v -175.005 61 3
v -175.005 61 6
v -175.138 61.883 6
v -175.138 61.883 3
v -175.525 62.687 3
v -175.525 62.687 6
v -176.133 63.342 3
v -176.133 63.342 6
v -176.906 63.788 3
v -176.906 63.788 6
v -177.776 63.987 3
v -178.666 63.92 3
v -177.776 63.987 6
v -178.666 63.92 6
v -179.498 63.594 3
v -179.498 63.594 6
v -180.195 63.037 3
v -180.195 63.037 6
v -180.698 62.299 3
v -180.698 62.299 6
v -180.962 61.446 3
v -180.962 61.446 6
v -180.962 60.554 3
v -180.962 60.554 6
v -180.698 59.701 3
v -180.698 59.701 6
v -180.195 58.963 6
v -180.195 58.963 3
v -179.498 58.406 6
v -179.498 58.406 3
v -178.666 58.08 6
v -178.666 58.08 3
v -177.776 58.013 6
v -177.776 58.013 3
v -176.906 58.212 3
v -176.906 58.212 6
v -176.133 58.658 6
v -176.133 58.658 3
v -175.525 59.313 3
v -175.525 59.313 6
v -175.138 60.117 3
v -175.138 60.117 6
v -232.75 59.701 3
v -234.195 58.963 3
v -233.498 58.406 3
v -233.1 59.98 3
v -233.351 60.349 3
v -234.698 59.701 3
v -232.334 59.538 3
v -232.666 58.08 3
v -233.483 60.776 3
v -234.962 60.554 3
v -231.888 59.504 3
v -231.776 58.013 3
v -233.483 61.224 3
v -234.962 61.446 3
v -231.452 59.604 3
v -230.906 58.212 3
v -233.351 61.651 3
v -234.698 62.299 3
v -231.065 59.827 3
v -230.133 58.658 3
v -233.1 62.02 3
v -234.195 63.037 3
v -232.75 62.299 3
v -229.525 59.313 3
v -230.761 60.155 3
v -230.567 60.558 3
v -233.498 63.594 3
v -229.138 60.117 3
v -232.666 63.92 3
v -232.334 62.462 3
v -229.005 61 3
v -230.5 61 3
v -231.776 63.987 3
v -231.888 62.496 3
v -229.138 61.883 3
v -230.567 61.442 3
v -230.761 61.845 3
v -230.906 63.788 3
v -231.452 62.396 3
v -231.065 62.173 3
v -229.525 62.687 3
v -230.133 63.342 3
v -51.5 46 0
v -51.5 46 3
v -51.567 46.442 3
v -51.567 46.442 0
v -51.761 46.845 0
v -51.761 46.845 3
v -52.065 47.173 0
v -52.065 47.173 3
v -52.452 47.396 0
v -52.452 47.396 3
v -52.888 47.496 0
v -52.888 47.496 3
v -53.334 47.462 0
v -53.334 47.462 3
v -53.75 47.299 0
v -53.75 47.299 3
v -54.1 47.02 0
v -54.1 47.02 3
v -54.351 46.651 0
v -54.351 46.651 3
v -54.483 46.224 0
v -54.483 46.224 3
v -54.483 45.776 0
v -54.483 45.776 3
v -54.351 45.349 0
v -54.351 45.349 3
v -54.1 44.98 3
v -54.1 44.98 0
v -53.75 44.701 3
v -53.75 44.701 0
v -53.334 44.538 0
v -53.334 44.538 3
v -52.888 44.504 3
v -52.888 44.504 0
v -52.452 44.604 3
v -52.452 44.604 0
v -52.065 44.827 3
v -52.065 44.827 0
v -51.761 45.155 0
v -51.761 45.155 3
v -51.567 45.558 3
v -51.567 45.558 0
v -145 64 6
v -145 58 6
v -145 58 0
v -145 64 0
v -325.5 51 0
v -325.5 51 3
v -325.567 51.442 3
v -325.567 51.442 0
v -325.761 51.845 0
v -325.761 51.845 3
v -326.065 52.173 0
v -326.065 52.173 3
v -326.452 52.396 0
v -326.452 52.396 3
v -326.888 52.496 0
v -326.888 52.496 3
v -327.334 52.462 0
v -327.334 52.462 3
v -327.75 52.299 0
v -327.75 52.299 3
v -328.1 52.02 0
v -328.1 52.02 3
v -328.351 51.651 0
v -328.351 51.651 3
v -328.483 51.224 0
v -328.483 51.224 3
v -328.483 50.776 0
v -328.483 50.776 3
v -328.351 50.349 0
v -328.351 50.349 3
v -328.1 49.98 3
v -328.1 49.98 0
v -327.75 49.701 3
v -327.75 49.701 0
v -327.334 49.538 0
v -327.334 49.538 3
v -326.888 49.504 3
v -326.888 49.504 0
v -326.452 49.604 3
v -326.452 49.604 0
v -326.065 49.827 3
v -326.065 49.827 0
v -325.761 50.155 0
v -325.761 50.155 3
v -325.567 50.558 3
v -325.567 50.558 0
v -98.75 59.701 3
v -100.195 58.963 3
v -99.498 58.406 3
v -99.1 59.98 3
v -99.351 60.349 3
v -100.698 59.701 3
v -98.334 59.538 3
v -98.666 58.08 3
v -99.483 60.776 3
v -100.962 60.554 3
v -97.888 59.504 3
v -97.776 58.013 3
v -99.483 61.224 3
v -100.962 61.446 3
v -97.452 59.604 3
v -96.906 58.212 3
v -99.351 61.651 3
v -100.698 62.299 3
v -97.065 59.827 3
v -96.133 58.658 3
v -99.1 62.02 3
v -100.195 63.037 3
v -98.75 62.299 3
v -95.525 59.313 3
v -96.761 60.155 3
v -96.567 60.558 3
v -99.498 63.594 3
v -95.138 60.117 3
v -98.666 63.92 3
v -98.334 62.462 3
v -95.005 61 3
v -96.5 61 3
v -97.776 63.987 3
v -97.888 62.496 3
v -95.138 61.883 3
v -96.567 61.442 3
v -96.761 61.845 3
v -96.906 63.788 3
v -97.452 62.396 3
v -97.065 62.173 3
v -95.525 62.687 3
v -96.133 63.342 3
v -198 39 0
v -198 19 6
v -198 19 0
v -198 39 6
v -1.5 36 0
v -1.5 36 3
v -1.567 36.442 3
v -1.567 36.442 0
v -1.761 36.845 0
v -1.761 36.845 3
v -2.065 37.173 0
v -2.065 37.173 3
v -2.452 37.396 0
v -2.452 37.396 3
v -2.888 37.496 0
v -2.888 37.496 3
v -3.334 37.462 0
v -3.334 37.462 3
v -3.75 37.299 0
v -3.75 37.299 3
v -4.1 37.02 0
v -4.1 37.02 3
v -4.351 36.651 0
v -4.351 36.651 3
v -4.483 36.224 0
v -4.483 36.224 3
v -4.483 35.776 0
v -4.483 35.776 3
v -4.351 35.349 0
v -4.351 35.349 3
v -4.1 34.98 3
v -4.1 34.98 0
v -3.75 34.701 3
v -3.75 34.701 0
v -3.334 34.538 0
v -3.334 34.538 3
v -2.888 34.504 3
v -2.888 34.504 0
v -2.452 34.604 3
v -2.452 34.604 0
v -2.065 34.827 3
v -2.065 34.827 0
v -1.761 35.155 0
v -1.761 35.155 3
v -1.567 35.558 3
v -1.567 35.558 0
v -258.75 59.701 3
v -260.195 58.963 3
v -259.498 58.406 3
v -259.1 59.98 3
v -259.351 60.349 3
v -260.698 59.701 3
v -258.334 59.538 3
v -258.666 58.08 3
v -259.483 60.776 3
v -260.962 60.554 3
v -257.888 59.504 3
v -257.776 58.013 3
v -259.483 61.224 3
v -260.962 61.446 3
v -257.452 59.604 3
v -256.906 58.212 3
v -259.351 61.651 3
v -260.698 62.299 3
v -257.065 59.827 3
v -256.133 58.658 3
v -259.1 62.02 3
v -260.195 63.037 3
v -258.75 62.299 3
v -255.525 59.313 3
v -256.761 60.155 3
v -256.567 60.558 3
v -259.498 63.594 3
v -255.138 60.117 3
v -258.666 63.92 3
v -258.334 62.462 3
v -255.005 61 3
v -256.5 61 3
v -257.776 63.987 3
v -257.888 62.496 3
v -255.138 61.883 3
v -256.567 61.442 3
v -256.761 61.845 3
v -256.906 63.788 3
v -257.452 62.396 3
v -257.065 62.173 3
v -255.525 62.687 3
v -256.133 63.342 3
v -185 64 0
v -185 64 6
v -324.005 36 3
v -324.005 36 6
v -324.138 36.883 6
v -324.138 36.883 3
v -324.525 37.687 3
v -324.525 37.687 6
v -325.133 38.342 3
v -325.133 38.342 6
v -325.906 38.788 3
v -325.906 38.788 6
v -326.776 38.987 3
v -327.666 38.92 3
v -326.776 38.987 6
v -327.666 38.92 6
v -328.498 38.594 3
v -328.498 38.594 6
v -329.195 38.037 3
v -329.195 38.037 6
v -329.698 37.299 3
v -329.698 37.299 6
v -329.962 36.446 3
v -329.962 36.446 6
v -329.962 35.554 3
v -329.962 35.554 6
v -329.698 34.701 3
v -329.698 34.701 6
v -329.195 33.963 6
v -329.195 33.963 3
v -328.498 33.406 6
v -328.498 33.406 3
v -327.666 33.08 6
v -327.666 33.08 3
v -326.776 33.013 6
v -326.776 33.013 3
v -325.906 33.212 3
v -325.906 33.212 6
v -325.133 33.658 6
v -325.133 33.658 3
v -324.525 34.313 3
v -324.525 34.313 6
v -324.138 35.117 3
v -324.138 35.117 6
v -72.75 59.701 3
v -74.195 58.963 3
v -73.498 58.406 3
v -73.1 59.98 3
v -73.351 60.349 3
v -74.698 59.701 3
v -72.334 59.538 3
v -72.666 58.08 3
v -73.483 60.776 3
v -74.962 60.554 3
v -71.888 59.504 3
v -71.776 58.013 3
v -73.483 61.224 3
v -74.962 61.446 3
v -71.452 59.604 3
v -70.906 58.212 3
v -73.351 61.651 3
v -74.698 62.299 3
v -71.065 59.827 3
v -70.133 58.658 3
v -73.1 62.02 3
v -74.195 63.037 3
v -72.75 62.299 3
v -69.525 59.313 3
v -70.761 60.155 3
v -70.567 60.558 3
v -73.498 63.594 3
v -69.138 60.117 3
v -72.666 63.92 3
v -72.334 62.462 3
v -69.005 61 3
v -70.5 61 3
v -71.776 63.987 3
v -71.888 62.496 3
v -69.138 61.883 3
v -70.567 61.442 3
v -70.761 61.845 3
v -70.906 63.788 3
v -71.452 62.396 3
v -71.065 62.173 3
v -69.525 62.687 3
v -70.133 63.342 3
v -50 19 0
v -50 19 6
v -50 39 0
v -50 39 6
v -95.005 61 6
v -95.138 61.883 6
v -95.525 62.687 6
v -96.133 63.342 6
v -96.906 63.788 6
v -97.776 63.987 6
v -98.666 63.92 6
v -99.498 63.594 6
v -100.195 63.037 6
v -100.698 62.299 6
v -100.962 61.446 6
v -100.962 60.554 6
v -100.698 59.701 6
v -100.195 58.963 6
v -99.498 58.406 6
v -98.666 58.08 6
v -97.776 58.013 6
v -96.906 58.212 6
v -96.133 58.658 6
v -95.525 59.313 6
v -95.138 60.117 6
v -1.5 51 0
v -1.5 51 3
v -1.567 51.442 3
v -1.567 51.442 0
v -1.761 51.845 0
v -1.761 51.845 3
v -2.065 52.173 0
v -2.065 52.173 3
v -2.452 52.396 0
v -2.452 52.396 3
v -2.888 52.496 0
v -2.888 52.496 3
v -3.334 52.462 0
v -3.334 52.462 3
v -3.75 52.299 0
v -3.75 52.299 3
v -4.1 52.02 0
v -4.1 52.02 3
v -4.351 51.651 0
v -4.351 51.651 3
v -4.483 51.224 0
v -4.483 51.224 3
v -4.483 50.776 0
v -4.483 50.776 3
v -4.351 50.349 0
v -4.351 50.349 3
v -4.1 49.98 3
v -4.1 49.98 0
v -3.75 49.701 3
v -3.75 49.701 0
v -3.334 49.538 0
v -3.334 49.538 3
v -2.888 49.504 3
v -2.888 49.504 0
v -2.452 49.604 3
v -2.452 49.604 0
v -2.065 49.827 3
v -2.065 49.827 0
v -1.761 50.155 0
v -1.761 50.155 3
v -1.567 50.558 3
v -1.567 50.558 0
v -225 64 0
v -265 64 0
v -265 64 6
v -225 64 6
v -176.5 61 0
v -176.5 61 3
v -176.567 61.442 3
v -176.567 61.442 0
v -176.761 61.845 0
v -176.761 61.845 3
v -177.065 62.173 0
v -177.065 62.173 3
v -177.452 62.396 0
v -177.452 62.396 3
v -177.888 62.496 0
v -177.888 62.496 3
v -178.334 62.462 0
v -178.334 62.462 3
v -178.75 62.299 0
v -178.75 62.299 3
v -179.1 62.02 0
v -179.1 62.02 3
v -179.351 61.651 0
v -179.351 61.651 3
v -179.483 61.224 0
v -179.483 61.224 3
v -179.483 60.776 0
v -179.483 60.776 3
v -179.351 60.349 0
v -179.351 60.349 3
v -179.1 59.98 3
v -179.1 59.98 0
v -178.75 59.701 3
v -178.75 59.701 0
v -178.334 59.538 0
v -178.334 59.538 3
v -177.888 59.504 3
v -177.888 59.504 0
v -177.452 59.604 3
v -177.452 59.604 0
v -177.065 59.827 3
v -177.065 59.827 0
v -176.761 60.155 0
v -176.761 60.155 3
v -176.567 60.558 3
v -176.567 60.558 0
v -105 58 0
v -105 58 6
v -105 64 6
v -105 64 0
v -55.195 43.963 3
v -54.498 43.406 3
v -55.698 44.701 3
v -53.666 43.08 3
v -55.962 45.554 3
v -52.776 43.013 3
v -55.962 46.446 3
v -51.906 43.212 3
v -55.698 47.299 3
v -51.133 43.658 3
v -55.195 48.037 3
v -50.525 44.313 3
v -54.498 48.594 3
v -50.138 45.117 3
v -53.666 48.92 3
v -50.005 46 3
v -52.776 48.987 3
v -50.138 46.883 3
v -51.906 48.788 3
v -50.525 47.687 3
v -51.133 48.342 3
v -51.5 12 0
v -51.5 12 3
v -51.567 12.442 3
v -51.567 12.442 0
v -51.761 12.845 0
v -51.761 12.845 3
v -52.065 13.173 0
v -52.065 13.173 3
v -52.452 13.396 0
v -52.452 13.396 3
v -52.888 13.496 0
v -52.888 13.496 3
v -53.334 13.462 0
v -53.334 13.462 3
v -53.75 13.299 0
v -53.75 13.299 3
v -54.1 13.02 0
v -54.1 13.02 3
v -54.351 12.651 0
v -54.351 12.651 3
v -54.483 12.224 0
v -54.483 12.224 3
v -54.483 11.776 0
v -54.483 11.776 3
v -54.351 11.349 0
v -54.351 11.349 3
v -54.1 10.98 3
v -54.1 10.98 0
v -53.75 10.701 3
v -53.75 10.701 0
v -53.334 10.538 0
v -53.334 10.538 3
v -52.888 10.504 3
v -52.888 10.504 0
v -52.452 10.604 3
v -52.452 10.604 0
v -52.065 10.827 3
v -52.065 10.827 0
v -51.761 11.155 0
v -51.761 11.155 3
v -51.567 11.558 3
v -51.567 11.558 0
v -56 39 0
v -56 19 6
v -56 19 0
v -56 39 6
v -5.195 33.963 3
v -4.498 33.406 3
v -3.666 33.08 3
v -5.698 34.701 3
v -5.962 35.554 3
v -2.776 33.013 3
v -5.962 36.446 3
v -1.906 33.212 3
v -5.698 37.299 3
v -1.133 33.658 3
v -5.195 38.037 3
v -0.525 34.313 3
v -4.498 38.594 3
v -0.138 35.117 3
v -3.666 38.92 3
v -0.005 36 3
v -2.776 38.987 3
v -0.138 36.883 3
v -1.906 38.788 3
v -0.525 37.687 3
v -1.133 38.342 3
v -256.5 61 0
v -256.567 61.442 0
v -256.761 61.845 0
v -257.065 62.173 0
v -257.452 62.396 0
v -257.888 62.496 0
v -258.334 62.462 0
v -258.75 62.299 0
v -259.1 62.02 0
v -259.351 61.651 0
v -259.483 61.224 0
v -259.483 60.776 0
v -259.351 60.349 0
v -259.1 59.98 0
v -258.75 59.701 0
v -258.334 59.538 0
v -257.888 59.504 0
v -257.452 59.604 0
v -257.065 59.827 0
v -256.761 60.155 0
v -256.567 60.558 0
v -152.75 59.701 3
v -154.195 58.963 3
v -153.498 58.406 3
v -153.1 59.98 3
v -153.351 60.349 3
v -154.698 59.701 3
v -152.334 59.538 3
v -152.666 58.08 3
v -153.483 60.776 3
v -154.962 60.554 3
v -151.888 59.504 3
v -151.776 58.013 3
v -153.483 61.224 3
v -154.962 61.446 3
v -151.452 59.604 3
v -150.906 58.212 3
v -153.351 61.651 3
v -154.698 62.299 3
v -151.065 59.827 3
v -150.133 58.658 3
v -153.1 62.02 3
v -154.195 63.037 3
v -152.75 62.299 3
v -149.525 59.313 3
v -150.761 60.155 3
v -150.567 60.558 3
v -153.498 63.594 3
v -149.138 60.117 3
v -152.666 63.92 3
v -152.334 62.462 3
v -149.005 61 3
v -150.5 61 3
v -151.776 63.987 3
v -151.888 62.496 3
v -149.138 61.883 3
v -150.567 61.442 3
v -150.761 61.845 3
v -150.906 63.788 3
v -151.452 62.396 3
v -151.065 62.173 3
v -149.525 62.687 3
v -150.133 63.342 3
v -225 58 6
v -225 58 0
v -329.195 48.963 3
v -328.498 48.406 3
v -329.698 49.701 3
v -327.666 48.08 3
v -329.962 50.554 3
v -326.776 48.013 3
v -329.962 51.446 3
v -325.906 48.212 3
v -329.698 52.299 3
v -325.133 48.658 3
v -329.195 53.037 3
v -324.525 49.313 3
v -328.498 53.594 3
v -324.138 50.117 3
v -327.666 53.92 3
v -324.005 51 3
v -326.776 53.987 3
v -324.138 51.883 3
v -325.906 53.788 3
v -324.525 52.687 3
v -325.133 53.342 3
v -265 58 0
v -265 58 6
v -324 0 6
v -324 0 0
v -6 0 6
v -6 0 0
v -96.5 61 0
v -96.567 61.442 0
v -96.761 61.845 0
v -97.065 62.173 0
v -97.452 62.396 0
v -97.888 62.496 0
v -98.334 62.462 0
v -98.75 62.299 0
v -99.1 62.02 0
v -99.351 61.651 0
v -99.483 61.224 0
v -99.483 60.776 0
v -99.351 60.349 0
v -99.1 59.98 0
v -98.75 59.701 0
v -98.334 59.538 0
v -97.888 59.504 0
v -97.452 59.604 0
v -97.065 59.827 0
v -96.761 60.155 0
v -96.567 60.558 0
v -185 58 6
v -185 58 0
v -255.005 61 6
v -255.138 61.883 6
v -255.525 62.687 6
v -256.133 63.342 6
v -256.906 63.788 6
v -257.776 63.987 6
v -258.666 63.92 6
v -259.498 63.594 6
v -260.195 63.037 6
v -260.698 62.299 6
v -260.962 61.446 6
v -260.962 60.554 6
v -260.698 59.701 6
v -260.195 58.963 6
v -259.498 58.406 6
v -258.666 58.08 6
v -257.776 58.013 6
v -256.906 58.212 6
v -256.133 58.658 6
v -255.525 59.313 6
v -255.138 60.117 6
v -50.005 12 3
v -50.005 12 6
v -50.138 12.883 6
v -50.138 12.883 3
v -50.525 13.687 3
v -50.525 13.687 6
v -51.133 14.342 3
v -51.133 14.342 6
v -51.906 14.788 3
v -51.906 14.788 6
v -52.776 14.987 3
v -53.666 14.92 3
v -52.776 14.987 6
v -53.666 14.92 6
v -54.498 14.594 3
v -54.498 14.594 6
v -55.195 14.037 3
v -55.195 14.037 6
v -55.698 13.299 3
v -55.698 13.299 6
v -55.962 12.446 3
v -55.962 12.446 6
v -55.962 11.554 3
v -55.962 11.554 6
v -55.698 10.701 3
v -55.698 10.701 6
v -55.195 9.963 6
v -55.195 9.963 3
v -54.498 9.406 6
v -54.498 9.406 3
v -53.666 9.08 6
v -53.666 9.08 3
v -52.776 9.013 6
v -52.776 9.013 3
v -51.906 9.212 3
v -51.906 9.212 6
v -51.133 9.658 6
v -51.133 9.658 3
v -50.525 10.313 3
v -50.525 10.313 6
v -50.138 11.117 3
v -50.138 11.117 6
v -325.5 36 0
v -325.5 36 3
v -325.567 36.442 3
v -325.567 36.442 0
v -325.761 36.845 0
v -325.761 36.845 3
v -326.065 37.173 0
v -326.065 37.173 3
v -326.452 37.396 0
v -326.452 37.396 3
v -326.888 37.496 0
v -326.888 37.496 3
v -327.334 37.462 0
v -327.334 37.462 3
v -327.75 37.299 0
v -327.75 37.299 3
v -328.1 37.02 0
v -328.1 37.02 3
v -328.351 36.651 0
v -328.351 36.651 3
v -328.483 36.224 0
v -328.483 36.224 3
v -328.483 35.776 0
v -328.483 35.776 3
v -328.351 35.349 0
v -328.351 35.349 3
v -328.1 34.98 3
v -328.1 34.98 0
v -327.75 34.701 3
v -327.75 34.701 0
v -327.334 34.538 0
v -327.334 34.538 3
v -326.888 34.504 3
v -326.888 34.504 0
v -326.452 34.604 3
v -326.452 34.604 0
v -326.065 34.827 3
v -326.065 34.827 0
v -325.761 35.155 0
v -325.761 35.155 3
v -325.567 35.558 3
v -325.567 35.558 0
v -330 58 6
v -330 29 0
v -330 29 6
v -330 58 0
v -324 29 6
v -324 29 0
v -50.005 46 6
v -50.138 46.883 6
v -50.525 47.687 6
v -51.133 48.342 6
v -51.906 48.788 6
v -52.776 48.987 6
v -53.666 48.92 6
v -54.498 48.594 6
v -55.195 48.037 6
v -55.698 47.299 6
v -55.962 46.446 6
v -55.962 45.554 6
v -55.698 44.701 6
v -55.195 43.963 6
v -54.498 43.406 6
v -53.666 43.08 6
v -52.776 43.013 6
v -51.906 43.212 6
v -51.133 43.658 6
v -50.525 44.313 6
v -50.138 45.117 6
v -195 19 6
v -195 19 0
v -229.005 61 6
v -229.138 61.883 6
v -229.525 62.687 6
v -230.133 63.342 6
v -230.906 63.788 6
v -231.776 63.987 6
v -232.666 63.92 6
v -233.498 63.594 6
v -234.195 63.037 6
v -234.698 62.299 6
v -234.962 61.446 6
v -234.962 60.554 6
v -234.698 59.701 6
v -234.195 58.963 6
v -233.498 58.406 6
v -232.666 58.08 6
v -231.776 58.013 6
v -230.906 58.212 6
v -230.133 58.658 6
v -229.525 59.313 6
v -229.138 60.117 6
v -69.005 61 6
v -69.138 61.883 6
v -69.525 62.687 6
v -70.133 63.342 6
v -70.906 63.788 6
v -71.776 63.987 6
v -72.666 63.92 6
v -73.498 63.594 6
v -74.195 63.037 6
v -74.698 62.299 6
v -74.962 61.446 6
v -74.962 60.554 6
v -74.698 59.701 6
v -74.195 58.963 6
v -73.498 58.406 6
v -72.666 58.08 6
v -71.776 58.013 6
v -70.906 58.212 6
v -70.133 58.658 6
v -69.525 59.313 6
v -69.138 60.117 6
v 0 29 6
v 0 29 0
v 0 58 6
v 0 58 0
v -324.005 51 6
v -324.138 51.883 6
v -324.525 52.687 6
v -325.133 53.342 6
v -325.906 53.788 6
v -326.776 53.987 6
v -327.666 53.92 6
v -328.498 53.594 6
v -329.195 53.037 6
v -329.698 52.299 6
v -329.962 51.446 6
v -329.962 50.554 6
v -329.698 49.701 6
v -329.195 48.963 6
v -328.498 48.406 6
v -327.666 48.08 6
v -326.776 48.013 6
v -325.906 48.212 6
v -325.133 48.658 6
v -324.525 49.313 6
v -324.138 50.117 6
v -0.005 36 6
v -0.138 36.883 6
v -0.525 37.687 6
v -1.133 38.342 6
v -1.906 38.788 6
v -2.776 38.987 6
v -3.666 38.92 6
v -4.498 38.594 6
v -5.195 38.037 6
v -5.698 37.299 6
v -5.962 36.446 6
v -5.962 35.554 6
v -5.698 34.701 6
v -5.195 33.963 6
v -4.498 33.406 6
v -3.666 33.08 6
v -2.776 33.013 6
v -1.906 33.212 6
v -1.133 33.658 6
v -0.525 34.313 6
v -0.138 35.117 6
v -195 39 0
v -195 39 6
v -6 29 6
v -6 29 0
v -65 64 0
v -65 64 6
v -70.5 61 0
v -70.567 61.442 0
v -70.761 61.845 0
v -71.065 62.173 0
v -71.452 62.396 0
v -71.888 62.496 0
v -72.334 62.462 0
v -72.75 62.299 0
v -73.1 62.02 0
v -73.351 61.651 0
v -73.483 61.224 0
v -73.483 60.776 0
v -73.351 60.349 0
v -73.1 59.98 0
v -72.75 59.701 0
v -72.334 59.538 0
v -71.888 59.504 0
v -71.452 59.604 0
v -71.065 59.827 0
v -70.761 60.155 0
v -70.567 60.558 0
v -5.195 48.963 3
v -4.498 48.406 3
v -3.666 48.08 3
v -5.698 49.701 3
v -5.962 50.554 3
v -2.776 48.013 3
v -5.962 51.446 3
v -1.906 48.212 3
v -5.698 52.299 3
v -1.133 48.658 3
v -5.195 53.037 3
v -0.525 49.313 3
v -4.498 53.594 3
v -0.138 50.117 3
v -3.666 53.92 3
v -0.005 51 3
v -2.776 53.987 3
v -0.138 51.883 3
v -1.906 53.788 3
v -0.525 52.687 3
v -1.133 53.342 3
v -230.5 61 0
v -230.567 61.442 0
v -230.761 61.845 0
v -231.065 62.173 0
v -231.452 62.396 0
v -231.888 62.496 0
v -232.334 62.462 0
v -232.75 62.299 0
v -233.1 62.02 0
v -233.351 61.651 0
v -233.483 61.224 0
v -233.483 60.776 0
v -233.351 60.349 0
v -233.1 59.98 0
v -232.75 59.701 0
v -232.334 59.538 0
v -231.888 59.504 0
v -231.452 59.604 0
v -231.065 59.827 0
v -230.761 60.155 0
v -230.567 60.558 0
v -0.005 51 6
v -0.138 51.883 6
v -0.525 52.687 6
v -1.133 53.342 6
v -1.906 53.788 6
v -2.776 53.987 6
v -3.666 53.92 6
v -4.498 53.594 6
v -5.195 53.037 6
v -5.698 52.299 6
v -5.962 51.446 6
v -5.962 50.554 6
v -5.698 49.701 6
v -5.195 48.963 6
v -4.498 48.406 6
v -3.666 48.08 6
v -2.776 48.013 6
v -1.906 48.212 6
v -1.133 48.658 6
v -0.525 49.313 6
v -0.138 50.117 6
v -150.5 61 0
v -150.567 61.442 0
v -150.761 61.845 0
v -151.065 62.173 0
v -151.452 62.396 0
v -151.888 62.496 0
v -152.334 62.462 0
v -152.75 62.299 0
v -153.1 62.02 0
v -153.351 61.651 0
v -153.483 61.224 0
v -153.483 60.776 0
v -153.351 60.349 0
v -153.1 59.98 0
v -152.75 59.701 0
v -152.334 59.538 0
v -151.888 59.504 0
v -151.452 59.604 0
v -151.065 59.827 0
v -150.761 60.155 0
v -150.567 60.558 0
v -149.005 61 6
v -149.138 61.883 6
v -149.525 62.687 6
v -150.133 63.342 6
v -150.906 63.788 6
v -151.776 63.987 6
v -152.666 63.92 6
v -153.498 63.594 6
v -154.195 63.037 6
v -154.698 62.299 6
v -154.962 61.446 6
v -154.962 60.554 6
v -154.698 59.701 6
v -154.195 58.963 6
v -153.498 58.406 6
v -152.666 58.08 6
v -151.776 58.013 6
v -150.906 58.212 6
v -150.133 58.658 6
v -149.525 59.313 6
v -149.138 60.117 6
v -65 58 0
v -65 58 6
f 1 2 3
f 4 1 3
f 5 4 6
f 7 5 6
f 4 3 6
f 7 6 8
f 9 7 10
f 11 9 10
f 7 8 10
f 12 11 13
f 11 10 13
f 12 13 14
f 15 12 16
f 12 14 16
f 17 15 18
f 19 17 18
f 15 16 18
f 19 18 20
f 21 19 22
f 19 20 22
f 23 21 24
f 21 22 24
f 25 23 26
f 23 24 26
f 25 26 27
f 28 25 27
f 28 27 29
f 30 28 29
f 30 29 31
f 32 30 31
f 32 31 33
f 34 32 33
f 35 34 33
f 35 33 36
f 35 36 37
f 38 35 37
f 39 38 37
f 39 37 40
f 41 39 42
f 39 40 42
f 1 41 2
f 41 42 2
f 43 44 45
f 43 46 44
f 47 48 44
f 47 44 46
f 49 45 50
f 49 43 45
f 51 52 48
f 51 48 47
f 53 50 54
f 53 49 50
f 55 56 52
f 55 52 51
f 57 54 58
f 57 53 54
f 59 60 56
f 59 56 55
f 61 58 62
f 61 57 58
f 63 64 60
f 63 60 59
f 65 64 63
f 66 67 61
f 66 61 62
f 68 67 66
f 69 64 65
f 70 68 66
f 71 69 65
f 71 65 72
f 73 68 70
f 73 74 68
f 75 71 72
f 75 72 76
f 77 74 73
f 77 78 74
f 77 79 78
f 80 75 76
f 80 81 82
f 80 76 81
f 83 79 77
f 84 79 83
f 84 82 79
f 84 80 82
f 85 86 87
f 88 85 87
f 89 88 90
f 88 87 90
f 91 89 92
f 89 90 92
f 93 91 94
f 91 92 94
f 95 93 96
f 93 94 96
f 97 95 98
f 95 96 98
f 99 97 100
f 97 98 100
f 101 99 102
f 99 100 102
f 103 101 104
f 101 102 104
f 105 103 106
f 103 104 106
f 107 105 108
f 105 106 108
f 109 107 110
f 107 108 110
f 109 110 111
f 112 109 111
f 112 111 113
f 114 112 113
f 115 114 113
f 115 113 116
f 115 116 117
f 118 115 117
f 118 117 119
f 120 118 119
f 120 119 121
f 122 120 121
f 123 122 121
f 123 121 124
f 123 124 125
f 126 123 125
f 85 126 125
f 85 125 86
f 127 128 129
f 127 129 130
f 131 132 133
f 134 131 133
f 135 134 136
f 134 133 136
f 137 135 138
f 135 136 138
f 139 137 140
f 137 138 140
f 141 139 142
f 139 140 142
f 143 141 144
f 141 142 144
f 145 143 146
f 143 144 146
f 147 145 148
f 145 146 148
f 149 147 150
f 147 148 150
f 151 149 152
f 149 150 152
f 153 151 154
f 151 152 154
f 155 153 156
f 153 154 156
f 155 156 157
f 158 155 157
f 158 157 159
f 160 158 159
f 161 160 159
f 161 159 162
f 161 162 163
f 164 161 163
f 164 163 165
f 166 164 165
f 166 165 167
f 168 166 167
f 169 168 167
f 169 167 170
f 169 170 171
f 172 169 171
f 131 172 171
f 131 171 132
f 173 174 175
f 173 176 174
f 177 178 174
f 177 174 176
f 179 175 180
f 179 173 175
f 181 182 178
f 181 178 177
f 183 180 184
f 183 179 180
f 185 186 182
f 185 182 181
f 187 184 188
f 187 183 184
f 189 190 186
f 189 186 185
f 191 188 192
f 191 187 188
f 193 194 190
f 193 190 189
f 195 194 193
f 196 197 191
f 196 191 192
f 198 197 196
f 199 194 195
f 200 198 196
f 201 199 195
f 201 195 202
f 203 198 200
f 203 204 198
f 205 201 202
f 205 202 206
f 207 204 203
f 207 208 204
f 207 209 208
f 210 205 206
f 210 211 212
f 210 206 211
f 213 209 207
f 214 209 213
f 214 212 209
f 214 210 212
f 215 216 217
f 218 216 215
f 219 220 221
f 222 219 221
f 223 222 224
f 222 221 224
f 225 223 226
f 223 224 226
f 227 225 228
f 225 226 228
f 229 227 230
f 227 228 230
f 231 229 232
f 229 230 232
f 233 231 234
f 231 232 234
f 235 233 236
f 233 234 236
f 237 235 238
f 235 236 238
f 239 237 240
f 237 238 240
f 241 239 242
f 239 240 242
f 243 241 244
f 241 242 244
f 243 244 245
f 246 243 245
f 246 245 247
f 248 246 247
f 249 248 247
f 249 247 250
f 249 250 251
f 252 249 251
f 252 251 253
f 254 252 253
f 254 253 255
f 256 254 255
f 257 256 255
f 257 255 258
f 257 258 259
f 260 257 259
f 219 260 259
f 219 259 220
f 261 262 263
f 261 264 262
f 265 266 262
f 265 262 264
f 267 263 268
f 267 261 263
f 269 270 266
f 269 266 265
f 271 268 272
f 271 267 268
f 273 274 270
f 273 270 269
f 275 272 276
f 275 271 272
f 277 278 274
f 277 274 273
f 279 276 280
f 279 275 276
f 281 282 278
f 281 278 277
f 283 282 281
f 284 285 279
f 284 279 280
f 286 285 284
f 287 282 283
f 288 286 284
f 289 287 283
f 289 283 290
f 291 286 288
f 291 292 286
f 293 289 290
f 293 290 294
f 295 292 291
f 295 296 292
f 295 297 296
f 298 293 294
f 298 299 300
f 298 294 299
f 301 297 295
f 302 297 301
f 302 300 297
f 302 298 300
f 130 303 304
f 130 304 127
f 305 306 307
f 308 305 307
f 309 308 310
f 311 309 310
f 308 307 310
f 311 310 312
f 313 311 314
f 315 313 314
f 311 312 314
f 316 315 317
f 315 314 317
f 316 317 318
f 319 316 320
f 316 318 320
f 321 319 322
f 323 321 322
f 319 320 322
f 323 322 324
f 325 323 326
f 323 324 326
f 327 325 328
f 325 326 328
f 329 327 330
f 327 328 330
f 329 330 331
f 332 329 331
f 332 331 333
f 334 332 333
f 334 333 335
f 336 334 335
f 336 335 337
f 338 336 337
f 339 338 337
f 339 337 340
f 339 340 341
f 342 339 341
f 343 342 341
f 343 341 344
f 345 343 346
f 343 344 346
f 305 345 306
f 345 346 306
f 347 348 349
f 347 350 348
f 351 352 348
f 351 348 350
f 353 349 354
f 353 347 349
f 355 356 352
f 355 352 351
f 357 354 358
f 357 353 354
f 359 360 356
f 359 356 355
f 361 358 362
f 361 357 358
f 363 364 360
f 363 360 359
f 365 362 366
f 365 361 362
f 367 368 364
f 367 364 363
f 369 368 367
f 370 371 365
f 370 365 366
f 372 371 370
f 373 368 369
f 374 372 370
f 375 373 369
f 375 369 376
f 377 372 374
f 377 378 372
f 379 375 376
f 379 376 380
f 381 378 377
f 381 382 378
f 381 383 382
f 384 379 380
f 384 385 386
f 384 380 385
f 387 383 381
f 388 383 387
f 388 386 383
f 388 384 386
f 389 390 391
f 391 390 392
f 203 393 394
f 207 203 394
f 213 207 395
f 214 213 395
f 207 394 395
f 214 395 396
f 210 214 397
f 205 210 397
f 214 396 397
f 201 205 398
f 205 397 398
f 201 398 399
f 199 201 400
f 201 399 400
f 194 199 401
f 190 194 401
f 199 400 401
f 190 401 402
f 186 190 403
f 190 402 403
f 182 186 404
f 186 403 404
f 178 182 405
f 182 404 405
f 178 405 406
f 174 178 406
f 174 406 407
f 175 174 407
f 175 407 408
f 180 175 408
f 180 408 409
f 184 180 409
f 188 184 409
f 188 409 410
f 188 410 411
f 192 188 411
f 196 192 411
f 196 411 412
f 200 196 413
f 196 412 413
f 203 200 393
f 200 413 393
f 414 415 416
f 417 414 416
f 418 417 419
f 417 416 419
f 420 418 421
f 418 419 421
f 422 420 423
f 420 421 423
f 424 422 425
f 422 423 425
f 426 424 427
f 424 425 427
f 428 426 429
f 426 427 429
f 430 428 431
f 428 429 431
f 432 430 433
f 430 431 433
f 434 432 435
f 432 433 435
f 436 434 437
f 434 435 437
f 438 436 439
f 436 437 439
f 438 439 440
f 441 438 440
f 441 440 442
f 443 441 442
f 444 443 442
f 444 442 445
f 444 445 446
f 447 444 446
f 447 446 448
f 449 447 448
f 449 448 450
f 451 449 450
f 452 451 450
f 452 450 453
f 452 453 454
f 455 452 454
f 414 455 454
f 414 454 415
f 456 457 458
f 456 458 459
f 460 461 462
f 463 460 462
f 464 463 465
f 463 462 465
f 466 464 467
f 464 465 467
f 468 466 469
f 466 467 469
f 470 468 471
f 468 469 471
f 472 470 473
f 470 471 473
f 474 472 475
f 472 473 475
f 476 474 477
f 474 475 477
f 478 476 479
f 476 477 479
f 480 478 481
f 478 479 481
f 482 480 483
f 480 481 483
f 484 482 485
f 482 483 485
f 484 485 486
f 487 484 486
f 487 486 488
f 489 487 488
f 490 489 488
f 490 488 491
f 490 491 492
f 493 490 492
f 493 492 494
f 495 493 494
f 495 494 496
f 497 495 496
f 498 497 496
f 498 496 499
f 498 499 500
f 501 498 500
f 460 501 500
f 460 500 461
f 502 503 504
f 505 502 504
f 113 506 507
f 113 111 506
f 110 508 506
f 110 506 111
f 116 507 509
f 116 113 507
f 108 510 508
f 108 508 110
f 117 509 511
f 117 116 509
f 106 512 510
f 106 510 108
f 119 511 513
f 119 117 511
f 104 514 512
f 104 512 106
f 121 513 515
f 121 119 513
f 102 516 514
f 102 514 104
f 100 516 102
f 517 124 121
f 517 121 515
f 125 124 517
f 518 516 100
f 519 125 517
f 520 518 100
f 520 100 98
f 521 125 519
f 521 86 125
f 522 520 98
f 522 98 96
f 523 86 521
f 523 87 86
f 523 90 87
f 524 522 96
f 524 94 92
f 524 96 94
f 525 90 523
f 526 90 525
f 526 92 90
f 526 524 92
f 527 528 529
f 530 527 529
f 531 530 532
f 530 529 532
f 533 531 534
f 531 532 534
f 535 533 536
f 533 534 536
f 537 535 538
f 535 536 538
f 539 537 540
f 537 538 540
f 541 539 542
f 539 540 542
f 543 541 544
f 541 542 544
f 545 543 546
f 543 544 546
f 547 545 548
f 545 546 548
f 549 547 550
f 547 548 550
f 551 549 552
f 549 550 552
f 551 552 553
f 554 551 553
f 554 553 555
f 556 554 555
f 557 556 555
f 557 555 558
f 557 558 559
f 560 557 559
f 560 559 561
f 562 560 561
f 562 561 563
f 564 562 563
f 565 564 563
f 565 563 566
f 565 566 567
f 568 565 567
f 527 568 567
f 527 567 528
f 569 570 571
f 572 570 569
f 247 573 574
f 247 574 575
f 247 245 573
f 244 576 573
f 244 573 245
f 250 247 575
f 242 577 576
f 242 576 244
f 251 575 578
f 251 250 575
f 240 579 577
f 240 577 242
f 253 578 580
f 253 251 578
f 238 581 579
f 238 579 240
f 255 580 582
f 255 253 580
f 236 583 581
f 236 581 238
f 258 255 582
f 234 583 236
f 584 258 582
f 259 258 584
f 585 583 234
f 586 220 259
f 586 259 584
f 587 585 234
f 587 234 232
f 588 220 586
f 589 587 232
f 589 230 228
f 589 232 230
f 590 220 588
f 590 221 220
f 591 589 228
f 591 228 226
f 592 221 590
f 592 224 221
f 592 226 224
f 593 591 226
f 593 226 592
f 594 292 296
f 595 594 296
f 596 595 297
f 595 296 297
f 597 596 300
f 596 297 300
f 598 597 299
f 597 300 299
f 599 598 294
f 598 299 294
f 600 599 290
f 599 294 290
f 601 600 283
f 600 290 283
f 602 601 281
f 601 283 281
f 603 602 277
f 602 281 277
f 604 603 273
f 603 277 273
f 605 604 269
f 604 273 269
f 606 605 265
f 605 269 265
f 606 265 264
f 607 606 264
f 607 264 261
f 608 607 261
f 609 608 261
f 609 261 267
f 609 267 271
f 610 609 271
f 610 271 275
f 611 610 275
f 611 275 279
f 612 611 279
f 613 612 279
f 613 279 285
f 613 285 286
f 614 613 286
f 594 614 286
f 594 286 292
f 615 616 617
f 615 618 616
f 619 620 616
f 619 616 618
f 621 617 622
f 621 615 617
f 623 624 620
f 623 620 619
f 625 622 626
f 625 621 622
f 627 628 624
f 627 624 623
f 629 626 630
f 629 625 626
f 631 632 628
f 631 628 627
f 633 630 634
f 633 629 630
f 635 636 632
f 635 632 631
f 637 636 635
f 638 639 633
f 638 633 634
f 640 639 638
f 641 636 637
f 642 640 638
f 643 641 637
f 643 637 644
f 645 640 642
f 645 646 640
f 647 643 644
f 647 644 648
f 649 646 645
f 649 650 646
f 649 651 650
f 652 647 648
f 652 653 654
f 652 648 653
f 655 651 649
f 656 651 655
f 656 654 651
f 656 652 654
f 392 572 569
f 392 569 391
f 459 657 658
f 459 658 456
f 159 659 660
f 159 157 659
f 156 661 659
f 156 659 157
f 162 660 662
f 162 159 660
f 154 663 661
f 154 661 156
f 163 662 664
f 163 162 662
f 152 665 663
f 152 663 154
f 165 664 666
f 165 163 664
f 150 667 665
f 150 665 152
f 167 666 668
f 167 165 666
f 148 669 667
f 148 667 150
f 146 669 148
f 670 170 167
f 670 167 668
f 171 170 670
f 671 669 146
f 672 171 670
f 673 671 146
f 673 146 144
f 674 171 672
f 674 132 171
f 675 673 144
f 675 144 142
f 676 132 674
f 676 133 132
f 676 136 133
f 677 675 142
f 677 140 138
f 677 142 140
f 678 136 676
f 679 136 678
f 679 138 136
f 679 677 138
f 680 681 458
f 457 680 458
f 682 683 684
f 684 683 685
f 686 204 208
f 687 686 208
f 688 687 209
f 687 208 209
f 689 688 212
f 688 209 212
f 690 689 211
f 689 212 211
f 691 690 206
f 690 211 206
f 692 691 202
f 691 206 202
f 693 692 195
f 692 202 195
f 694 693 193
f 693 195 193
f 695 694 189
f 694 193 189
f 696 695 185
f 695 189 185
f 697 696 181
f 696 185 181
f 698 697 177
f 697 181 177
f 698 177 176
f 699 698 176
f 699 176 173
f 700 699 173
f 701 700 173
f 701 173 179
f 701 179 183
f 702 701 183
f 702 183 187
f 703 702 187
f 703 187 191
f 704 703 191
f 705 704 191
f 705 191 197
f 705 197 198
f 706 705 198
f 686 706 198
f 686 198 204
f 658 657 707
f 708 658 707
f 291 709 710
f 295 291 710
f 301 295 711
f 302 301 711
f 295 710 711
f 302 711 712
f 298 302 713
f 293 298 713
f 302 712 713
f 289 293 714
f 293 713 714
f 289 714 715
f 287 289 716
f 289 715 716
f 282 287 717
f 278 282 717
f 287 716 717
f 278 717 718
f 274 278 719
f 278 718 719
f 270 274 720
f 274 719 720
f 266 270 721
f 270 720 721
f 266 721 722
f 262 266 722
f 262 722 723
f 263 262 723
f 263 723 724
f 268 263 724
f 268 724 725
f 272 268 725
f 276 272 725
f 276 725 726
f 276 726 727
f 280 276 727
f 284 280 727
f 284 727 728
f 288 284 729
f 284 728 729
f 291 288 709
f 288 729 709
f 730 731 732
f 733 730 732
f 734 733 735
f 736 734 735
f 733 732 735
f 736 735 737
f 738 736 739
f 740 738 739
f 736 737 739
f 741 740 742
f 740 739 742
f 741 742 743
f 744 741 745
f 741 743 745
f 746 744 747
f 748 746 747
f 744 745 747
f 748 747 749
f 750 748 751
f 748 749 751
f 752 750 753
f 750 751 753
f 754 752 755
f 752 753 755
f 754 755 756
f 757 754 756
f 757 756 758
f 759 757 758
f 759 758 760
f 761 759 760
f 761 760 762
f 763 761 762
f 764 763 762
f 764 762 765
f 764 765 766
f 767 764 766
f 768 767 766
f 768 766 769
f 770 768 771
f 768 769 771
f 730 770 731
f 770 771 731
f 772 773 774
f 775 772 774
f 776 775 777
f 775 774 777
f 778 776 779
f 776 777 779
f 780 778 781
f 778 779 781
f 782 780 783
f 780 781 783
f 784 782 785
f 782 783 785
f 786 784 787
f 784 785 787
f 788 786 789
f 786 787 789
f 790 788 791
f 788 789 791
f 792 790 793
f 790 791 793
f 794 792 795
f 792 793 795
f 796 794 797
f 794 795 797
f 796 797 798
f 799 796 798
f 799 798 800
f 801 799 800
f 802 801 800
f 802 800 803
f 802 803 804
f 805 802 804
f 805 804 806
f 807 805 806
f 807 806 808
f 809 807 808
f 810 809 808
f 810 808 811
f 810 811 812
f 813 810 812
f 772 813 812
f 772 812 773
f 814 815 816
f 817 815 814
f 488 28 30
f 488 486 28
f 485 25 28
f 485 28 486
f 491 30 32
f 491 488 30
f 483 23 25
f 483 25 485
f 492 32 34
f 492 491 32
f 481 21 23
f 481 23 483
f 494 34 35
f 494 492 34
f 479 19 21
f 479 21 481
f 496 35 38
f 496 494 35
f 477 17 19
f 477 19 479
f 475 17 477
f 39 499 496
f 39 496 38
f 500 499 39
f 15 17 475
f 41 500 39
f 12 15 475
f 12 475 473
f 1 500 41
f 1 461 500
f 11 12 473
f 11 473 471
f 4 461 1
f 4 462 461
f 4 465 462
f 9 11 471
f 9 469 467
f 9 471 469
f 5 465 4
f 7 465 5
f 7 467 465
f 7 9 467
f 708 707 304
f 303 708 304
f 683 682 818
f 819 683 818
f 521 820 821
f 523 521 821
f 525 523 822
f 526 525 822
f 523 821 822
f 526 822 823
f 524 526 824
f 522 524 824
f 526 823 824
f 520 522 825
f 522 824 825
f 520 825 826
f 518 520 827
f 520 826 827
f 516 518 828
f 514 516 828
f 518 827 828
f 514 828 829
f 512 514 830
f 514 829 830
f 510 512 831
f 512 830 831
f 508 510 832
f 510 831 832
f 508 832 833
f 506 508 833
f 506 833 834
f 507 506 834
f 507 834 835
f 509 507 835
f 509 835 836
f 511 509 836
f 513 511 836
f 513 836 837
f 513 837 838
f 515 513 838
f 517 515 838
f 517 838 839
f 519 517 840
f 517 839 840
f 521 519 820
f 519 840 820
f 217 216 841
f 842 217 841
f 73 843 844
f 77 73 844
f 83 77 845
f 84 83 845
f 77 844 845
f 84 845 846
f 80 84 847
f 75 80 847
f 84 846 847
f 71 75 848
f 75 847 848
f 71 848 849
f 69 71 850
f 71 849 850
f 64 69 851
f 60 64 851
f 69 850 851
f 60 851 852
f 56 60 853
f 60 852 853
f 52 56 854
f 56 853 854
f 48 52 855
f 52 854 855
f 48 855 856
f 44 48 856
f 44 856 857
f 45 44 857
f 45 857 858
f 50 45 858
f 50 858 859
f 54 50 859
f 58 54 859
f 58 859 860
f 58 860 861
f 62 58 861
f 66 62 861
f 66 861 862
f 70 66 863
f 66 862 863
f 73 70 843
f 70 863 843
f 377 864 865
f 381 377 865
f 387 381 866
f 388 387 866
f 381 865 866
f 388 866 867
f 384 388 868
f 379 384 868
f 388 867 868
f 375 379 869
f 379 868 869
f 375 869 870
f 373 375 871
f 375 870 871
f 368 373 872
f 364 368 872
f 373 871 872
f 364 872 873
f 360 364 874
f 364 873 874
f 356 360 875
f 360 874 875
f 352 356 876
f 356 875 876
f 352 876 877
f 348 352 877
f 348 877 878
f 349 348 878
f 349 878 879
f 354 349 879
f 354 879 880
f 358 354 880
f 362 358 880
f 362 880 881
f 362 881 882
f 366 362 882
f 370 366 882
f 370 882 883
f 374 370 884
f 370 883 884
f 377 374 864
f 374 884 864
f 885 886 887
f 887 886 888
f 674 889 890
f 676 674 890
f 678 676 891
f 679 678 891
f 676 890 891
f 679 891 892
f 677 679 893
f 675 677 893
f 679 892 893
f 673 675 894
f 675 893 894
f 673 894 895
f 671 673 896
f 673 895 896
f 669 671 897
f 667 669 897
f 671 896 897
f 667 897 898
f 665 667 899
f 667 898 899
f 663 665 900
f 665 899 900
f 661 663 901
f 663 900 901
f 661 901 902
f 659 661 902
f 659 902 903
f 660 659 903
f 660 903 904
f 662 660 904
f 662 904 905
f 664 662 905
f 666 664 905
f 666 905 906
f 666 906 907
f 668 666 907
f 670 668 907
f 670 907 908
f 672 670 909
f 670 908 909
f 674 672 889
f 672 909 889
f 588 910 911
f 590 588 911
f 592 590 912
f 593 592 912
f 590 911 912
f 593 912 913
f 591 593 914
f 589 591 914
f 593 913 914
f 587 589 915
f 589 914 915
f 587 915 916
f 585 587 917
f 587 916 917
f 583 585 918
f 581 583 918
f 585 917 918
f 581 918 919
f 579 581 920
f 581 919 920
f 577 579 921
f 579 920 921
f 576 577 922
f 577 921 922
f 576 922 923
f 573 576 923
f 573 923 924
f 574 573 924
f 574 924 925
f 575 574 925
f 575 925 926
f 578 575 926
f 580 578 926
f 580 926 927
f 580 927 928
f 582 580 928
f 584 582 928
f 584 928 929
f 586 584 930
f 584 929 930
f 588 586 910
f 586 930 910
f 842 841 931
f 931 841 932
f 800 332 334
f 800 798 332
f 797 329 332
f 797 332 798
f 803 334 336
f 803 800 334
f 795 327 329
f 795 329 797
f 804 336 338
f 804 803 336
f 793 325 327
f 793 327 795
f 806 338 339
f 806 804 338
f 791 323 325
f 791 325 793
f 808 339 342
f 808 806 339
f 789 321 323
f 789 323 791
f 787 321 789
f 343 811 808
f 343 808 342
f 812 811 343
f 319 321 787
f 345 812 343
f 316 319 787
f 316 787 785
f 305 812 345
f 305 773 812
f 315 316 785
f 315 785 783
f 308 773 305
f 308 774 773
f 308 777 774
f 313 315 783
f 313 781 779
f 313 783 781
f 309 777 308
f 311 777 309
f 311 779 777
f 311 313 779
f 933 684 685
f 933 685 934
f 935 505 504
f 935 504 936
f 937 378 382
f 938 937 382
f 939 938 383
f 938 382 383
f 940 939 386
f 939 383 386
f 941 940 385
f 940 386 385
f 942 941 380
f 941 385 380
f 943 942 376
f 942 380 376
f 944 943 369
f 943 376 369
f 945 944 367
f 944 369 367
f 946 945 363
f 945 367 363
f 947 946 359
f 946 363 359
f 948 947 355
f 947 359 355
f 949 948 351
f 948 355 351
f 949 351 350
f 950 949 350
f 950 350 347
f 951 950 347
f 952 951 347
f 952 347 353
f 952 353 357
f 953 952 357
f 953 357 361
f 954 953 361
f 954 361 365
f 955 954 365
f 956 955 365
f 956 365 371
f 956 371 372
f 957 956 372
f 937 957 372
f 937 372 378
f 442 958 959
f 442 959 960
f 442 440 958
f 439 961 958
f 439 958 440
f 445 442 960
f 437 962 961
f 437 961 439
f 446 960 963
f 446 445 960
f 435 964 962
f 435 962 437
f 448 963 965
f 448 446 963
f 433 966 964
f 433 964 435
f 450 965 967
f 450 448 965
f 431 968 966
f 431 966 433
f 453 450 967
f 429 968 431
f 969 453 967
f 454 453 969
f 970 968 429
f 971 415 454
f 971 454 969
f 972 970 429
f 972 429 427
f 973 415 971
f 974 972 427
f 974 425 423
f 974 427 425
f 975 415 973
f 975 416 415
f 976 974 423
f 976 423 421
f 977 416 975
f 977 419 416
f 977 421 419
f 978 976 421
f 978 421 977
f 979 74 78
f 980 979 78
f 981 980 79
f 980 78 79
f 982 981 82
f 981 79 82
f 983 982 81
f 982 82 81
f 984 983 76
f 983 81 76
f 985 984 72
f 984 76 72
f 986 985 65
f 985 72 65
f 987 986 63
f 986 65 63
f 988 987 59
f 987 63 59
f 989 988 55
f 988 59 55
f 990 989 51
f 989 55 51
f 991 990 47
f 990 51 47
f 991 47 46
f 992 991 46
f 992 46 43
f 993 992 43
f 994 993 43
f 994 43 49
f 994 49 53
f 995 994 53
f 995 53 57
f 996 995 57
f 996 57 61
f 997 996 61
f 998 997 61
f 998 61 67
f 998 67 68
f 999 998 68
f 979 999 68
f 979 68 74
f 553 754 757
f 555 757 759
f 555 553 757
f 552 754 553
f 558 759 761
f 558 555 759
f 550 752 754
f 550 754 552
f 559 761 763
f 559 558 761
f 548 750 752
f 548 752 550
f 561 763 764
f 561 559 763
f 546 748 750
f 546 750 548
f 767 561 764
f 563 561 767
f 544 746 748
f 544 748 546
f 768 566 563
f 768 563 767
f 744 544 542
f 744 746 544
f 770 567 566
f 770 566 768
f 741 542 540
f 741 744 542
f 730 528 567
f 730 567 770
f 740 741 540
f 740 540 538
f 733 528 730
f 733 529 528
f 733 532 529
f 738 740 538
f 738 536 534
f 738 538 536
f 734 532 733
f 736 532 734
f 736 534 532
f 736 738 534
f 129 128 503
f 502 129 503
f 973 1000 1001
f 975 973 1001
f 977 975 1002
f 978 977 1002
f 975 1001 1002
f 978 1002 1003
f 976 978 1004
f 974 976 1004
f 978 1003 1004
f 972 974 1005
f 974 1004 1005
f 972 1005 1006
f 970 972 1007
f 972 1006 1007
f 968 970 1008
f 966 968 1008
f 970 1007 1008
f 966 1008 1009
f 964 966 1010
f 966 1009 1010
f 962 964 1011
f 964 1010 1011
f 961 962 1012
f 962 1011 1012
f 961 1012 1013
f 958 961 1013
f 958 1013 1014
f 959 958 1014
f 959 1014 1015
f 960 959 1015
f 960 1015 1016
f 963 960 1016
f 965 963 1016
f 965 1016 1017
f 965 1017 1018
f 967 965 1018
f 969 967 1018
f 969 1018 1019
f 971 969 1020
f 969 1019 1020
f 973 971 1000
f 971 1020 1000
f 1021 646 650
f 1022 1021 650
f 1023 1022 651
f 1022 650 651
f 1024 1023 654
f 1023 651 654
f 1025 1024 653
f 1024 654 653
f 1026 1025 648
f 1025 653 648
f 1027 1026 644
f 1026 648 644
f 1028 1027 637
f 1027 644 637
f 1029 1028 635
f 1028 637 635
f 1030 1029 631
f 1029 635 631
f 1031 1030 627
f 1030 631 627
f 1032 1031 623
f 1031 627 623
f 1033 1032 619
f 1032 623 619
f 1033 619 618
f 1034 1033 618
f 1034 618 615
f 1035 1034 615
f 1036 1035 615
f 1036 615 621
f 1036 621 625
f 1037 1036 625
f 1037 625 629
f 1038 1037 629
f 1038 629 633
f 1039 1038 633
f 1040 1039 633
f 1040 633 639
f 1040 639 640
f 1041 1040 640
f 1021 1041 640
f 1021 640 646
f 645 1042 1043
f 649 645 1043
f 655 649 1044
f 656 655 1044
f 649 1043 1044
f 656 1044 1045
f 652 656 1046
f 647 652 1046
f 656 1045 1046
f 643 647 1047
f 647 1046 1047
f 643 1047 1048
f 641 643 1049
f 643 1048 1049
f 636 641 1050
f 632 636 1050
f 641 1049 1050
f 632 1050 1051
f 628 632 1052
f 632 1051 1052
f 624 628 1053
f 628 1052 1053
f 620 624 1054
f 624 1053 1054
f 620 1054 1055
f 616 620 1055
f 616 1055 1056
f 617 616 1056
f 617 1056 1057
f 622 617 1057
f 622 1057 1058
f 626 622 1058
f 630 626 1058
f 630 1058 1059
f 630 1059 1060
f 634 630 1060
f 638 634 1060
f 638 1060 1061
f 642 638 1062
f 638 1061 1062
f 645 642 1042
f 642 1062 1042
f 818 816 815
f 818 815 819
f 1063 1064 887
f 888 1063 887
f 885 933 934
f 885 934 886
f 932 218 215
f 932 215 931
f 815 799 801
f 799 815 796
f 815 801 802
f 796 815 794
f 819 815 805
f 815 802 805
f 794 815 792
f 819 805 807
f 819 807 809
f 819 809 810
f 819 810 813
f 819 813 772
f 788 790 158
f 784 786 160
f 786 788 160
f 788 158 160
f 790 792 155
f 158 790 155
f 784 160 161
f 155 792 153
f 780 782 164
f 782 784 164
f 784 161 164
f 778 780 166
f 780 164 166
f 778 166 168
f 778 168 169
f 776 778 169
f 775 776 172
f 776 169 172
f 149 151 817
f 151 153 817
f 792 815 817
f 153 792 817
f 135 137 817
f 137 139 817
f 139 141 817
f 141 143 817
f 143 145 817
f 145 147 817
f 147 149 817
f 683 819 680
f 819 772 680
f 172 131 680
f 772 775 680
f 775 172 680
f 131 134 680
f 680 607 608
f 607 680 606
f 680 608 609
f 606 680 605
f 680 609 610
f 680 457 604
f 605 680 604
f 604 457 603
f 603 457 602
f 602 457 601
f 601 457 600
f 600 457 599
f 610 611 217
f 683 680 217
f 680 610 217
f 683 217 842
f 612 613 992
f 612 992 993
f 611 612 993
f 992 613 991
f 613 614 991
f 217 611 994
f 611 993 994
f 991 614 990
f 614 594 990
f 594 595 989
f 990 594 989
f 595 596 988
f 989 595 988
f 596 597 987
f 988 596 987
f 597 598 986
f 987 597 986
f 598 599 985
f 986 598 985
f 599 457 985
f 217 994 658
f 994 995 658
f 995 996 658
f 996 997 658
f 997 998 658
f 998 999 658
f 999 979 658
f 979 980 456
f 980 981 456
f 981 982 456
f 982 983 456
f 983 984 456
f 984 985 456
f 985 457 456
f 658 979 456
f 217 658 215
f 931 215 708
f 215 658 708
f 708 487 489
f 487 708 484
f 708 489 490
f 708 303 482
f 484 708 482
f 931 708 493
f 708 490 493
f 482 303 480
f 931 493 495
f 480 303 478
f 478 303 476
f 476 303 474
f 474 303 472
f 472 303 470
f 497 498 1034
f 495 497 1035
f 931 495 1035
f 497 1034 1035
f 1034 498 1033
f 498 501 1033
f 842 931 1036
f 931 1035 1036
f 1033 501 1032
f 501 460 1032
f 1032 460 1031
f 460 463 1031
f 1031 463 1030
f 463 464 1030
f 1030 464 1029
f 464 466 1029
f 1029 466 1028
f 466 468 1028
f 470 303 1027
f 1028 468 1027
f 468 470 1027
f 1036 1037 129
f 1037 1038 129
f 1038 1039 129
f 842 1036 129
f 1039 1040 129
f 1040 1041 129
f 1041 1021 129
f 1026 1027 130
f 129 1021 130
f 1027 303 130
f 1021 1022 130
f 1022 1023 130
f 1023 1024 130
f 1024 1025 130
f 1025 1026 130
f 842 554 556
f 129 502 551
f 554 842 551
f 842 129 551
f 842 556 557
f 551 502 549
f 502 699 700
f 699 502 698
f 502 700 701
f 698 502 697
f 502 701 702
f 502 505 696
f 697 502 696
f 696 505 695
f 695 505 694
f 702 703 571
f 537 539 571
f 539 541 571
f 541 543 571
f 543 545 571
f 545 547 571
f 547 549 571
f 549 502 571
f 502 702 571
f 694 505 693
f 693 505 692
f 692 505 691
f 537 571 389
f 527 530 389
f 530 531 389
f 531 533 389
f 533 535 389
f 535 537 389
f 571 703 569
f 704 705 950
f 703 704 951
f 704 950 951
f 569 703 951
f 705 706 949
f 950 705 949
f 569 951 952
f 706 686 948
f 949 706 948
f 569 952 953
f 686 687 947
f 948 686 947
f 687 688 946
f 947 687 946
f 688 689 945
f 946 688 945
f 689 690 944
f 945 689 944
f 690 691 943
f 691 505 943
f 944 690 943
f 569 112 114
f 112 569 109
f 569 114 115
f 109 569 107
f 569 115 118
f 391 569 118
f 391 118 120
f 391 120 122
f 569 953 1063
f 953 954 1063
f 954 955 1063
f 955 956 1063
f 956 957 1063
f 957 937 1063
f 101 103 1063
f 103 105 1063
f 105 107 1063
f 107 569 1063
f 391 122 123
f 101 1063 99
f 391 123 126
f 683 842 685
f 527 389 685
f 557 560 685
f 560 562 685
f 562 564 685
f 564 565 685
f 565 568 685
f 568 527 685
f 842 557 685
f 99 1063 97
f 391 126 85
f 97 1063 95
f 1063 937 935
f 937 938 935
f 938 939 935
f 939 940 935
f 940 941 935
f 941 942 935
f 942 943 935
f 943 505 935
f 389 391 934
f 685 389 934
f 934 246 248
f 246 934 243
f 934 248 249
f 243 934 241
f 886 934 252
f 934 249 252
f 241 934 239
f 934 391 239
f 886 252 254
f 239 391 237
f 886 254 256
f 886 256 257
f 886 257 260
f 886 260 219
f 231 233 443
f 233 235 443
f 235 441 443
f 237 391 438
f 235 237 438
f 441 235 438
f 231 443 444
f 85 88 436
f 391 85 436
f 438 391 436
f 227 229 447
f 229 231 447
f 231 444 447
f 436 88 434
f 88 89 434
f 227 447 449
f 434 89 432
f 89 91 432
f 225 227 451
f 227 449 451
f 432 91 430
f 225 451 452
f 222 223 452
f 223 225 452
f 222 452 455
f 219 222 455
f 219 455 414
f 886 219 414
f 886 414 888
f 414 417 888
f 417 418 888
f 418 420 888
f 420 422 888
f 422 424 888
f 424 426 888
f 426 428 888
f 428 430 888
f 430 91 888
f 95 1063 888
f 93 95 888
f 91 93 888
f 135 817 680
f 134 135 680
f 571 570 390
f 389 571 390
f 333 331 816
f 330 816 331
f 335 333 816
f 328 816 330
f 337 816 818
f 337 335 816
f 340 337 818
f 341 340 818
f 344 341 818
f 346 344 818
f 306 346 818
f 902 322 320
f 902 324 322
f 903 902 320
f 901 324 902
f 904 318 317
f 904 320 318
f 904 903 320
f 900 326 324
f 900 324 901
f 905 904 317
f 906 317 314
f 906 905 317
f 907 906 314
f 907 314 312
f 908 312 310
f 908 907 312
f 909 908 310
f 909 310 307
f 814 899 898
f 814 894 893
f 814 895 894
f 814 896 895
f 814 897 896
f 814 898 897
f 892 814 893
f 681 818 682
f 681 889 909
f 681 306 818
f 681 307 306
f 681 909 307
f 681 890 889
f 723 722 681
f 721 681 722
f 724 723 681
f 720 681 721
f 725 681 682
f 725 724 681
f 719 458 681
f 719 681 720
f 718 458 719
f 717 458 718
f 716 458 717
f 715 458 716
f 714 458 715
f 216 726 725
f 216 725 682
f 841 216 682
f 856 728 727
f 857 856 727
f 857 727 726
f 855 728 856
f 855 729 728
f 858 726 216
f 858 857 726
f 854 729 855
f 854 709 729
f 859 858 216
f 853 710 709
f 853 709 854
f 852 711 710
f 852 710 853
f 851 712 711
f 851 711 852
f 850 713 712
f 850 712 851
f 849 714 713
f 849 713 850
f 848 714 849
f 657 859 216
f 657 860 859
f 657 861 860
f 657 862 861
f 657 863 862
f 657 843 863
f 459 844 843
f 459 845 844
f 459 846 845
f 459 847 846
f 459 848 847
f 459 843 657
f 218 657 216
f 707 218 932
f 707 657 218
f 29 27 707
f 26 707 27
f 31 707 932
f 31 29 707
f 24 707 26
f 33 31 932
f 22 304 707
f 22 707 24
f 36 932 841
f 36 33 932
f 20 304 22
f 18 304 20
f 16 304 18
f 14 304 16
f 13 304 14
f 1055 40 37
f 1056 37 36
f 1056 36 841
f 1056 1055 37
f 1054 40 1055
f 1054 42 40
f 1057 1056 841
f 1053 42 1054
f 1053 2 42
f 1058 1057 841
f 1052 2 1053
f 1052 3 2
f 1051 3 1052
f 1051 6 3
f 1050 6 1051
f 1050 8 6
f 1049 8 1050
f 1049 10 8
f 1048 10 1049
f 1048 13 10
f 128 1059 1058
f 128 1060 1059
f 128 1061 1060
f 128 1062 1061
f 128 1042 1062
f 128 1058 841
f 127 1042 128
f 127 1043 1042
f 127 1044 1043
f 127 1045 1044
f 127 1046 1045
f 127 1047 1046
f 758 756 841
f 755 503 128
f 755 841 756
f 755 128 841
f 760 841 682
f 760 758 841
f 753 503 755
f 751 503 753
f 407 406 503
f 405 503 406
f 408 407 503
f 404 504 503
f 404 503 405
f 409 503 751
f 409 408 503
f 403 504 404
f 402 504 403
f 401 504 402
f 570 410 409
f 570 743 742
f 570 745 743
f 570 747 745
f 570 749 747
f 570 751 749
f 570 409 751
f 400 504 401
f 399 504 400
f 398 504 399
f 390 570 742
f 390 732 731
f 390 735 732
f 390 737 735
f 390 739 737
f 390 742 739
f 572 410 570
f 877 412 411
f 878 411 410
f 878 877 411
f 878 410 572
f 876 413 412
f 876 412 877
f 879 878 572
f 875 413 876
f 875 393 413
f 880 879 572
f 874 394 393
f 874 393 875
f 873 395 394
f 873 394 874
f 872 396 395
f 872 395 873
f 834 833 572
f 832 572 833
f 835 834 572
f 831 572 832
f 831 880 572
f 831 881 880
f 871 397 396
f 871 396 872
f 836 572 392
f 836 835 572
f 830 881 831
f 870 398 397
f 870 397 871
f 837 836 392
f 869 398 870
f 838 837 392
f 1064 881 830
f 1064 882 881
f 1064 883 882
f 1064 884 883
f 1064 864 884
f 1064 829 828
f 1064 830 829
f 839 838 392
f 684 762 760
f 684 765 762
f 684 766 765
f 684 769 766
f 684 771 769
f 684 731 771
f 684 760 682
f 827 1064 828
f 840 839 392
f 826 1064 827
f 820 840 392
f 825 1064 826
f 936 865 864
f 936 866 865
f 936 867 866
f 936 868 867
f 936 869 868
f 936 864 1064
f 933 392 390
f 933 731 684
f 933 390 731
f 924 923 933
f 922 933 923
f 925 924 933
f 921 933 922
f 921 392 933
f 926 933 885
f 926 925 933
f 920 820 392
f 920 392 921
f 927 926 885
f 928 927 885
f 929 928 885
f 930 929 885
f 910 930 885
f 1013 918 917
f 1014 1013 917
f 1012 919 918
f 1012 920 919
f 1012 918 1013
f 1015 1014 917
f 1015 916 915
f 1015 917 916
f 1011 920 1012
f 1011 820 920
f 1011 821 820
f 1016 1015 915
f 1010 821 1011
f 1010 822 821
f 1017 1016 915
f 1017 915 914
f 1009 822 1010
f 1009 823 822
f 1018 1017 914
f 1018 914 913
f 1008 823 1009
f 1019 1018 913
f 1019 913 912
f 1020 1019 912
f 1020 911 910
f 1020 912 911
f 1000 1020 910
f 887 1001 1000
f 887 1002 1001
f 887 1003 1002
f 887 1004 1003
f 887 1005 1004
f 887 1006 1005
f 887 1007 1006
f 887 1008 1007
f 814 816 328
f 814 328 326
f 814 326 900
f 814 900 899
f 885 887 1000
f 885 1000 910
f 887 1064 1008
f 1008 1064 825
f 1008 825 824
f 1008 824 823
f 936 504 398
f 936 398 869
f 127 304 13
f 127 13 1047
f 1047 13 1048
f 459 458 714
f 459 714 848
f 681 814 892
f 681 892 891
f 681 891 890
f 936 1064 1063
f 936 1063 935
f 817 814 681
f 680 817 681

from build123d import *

# Parameters (mm, degrees)
ESQUISSE1_W             = 330
ESQUISSE1_H             = 64
BOSS_EXTRU_1_DEPTH      = 6
ESQUISSE2_W             = 65
ESQUISSE2_H             = 6
ESQUISSE2_W_2           = 40
ESQUISSE2_W_3           = 6
ESQUISSE2_H_2           = 29
ENL_V_MAT_EXTRU_1_DEPTH = 337.20232004
ESQUISSE3_W             = 3
ESQUISSE3_H             = 20
ESQUISSE3_W_2           = 6
ENL_V_MAT_EXTRU_2_DEPTH = 337.20232004
ESQUISSE4_R             = 1.5
ENL_V_MAT_EXTRU_3_DEPTH = 337.20232004
ESQUISSE5_R             = 2.995
ENL_V_MAT_EXTRU_4_DEPTH = 3


with BuildPart() as part:
    # Esquisse1 → Boss.-Extru.1 (new body)
    with BuildSketch(Plane.XY):
        with Locations((-165, 32)):
            Rectangle(ESQUISSE1_W, ESQUISSE1_H)
    extrude(amount=BOSS_EXTRU_1_DEPTH)

    # Esquisse2 → Enlèv. mat.-Extru.1 (cut, through all)
    with BuildSketch(Plane.XY.offset(6)):
        with Locations((-297.5, 61)):
            Rectangle(ESQUISSE2_W, ESQUISSE2_H)
        with Locations((-205, 61)):
            Rectangle(ESQUISSE2_W_2, ESQUISSE2_H)
        with Locations((-125, 61)):
            Rectangle(ESQUISSE2_W_2, ESQUISSE2_H)
        with Locations((-32.5, 61)):
            Rectangle(ESQUISSE2_W, ESQUISSE2_H)
        with Locations((-327, 14.5)):
            Rectangle(ESQUISSE2_W_3, ESQUISSE2_H_2)
        with Locations((-3, 14.5)):
            Rectangle(ESQUISSE2_W_3, ESQUISSE2_H_2)
    extrude(amount=-ENL_V_MAT_EXTRU_1_DEPTH, mode=Mode.SUBTRACT)

    # Esquisse3 → Enlèv. mat.-Extru.2 (cut, through all)
    with BuildSketch(Plane.XY.offset(6)):
        with Locations((-196.5, 29)):
            Rectangle(ESQUISSE3_W, ESQUISSE3_H)
        with Locations((-53, 29)):
            Rectangle(ESQUISSE3_W_2, ESQUISSE3_H)
    extrude(amount=-ENL_V_MAT_EXTRU_2_DEPTH, mode=Mode.SUBTRACT)

    # Esquisse4 → Enlèv. mat.-Extru.3 (cut, through all)
    with BuildSketch(Plane.XY.offset(6)):
        with Locations((-327, 51)):
            Circle(ESQUISSE4_R)
        with Locations((-327, 36)):
            Circle(ESQUISSE4_R)
        with Locations((-3, 36)):
            Circle(ESQUISSE4_R)
        with Locations((-258, 61)):
            Circle(ESQUISSE4_R)
        with Locations((-232, 61)):
            Circle(ESQUISSE4_R)
        with Locations((-178, 61)):
            Circle(ESQUISSE4_R)
        with Locations((-152, 61)):
            Circle(ESQUISSE4_R)
        with Locations((-98, 61)):
            Circle(ESQUISSE4_R)
        with Locations((-72, 61)):
            Circle(ESQUISSE4_R)
        with Locations((-53, 46)):
            Circle(ESQUISSE4_R)
        with Locations((-53, 12)):
            Circle(ESQUISSE4_R)
        with Locations((-3, 51)):
            Circle(ESQUISSE4_R)
    extrude(amount=-ENL_V_MAT_EXTRU_3_DEPTH, mode=Mode.SUBTRACT)

    # Esquisse5 → Enlèv. mat.-Extru.4 (cut)
    with BuildSketch(Plane.XY.offset(6)):
        with Locations((-3, 36)):
            Circle(ESQUISSE5_R)
        with Locations((-327, 36)):
            Circle(ESQUISSE5_R)
        with Locations((-327, 51)):
            Circle(ESQUISSE5_R)
        with Locations((-258, 61)):
            Circle(ESQUISSE5_R)
        with Locations((-232, 61)):
            Circle(ESQUISSE5_R)
        with Locations((-178, 61)):
            Circle(ESQUISSE5_R)
        with Locations((-152, 61)):
            Circle(ESQUISSE5_R)
        with Locations((-98, 61)):
            Circle(ESQUISSE5_R)
        with Locations((-72, 61)):
            Circle(ESQUISSE5_R)
        with Locations((-53, 46)):
            Circle(ESQUISSE5_R)
        with Locations((-53, 12)):
            Circle(ESQUISSE5_R)
        with Locations((-3, 51)):
            Circle(ESQUISSE5_R)
    extrude(amount=-ENL_V_MAT_EXTRU_4_DEPTH, mode=Mode.SUBTRACT)


solid = part.part
